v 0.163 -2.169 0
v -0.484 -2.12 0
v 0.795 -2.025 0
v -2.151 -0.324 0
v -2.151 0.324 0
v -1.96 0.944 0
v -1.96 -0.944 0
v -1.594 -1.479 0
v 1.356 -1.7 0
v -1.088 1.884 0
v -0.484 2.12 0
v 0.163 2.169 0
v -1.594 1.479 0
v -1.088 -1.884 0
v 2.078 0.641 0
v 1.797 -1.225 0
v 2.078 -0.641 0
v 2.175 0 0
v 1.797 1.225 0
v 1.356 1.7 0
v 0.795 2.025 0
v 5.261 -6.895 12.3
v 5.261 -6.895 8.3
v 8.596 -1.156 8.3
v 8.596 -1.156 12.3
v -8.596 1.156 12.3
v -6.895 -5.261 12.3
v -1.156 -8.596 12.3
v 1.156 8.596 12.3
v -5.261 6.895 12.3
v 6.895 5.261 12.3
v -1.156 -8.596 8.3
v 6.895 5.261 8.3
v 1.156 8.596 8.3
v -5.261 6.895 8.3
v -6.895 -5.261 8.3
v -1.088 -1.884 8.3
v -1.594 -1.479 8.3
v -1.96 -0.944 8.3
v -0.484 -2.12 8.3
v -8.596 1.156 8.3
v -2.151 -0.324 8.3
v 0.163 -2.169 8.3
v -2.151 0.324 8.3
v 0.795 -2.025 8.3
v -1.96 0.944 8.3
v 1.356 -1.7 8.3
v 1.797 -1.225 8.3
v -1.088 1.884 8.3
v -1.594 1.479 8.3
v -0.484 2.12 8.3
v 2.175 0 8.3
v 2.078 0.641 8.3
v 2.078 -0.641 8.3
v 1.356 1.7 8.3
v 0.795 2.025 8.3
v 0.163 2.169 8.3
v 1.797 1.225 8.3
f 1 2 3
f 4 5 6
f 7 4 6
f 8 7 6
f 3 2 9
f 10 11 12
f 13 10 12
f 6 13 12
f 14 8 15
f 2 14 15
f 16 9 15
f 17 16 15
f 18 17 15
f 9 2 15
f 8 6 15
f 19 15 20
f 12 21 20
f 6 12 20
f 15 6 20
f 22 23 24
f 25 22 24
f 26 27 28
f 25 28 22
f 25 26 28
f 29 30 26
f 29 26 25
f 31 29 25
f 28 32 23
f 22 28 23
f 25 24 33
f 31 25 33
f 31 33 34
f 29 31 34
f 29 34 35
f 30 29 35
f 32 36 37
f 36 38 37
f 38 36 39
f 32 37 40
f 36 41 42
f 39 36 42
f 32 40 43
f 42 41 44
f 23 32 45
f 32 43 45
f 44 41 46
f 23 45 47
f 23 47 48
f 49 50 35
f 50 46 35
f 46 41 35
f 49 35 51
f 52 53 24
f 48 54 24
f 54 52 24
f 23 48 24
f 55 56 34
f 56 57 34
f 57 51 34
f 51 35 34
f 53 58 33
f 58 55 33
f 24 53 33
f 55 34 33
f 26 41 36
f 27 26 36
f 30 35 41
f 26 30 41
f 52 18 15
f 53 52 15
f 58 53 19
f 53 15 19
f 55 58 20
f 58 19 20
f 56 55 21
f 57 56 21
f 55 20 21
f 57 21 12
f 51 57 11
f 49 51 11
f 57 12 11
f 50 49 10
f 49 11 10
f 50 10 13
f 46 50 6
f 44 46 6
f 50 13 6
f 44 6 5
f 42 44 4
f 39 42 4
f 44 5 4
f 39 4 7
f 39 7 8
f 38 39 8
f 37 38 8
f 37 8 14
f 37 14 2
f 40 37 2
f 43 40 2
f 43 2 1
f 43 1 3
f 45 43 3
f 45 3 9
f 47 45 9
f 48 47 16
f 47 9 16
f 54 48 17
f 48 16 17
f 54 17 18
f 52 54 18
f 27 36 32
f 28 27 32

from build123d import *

# Parameters (mm, degrees)
F0_R     = 2.175
F1_DEPTH = 8.3
F2_R     = 2.175
F3_DEPTH = 4


with BuildPart() as f1:
    # F0 (on Top) → F1 (new body)
    with BuildSketch(Plane.XY):
        Circle(F0_R)
    extrude(amount=F1_DEPTH)

    # F2 (on face) → F3 (join)
    with BuildSketch(Plane.XY.offset(8.3)):
        Polygon((5.26072, -6.895255), (8.595572, -1.15579), (6.895255, 5.26072), (1.15579, 8.595572), (-5.26072, 6.895255), (-8.595572, 1.15579), (-6.895255, -5.26072), (-1.15579, -8.595572), align=None)
        Circle(F2_R, mode=Mode.SUBTRACT)
        Circle(F2_R)
    extrude(amount=F3_DEPTH)


solid = f1.part
